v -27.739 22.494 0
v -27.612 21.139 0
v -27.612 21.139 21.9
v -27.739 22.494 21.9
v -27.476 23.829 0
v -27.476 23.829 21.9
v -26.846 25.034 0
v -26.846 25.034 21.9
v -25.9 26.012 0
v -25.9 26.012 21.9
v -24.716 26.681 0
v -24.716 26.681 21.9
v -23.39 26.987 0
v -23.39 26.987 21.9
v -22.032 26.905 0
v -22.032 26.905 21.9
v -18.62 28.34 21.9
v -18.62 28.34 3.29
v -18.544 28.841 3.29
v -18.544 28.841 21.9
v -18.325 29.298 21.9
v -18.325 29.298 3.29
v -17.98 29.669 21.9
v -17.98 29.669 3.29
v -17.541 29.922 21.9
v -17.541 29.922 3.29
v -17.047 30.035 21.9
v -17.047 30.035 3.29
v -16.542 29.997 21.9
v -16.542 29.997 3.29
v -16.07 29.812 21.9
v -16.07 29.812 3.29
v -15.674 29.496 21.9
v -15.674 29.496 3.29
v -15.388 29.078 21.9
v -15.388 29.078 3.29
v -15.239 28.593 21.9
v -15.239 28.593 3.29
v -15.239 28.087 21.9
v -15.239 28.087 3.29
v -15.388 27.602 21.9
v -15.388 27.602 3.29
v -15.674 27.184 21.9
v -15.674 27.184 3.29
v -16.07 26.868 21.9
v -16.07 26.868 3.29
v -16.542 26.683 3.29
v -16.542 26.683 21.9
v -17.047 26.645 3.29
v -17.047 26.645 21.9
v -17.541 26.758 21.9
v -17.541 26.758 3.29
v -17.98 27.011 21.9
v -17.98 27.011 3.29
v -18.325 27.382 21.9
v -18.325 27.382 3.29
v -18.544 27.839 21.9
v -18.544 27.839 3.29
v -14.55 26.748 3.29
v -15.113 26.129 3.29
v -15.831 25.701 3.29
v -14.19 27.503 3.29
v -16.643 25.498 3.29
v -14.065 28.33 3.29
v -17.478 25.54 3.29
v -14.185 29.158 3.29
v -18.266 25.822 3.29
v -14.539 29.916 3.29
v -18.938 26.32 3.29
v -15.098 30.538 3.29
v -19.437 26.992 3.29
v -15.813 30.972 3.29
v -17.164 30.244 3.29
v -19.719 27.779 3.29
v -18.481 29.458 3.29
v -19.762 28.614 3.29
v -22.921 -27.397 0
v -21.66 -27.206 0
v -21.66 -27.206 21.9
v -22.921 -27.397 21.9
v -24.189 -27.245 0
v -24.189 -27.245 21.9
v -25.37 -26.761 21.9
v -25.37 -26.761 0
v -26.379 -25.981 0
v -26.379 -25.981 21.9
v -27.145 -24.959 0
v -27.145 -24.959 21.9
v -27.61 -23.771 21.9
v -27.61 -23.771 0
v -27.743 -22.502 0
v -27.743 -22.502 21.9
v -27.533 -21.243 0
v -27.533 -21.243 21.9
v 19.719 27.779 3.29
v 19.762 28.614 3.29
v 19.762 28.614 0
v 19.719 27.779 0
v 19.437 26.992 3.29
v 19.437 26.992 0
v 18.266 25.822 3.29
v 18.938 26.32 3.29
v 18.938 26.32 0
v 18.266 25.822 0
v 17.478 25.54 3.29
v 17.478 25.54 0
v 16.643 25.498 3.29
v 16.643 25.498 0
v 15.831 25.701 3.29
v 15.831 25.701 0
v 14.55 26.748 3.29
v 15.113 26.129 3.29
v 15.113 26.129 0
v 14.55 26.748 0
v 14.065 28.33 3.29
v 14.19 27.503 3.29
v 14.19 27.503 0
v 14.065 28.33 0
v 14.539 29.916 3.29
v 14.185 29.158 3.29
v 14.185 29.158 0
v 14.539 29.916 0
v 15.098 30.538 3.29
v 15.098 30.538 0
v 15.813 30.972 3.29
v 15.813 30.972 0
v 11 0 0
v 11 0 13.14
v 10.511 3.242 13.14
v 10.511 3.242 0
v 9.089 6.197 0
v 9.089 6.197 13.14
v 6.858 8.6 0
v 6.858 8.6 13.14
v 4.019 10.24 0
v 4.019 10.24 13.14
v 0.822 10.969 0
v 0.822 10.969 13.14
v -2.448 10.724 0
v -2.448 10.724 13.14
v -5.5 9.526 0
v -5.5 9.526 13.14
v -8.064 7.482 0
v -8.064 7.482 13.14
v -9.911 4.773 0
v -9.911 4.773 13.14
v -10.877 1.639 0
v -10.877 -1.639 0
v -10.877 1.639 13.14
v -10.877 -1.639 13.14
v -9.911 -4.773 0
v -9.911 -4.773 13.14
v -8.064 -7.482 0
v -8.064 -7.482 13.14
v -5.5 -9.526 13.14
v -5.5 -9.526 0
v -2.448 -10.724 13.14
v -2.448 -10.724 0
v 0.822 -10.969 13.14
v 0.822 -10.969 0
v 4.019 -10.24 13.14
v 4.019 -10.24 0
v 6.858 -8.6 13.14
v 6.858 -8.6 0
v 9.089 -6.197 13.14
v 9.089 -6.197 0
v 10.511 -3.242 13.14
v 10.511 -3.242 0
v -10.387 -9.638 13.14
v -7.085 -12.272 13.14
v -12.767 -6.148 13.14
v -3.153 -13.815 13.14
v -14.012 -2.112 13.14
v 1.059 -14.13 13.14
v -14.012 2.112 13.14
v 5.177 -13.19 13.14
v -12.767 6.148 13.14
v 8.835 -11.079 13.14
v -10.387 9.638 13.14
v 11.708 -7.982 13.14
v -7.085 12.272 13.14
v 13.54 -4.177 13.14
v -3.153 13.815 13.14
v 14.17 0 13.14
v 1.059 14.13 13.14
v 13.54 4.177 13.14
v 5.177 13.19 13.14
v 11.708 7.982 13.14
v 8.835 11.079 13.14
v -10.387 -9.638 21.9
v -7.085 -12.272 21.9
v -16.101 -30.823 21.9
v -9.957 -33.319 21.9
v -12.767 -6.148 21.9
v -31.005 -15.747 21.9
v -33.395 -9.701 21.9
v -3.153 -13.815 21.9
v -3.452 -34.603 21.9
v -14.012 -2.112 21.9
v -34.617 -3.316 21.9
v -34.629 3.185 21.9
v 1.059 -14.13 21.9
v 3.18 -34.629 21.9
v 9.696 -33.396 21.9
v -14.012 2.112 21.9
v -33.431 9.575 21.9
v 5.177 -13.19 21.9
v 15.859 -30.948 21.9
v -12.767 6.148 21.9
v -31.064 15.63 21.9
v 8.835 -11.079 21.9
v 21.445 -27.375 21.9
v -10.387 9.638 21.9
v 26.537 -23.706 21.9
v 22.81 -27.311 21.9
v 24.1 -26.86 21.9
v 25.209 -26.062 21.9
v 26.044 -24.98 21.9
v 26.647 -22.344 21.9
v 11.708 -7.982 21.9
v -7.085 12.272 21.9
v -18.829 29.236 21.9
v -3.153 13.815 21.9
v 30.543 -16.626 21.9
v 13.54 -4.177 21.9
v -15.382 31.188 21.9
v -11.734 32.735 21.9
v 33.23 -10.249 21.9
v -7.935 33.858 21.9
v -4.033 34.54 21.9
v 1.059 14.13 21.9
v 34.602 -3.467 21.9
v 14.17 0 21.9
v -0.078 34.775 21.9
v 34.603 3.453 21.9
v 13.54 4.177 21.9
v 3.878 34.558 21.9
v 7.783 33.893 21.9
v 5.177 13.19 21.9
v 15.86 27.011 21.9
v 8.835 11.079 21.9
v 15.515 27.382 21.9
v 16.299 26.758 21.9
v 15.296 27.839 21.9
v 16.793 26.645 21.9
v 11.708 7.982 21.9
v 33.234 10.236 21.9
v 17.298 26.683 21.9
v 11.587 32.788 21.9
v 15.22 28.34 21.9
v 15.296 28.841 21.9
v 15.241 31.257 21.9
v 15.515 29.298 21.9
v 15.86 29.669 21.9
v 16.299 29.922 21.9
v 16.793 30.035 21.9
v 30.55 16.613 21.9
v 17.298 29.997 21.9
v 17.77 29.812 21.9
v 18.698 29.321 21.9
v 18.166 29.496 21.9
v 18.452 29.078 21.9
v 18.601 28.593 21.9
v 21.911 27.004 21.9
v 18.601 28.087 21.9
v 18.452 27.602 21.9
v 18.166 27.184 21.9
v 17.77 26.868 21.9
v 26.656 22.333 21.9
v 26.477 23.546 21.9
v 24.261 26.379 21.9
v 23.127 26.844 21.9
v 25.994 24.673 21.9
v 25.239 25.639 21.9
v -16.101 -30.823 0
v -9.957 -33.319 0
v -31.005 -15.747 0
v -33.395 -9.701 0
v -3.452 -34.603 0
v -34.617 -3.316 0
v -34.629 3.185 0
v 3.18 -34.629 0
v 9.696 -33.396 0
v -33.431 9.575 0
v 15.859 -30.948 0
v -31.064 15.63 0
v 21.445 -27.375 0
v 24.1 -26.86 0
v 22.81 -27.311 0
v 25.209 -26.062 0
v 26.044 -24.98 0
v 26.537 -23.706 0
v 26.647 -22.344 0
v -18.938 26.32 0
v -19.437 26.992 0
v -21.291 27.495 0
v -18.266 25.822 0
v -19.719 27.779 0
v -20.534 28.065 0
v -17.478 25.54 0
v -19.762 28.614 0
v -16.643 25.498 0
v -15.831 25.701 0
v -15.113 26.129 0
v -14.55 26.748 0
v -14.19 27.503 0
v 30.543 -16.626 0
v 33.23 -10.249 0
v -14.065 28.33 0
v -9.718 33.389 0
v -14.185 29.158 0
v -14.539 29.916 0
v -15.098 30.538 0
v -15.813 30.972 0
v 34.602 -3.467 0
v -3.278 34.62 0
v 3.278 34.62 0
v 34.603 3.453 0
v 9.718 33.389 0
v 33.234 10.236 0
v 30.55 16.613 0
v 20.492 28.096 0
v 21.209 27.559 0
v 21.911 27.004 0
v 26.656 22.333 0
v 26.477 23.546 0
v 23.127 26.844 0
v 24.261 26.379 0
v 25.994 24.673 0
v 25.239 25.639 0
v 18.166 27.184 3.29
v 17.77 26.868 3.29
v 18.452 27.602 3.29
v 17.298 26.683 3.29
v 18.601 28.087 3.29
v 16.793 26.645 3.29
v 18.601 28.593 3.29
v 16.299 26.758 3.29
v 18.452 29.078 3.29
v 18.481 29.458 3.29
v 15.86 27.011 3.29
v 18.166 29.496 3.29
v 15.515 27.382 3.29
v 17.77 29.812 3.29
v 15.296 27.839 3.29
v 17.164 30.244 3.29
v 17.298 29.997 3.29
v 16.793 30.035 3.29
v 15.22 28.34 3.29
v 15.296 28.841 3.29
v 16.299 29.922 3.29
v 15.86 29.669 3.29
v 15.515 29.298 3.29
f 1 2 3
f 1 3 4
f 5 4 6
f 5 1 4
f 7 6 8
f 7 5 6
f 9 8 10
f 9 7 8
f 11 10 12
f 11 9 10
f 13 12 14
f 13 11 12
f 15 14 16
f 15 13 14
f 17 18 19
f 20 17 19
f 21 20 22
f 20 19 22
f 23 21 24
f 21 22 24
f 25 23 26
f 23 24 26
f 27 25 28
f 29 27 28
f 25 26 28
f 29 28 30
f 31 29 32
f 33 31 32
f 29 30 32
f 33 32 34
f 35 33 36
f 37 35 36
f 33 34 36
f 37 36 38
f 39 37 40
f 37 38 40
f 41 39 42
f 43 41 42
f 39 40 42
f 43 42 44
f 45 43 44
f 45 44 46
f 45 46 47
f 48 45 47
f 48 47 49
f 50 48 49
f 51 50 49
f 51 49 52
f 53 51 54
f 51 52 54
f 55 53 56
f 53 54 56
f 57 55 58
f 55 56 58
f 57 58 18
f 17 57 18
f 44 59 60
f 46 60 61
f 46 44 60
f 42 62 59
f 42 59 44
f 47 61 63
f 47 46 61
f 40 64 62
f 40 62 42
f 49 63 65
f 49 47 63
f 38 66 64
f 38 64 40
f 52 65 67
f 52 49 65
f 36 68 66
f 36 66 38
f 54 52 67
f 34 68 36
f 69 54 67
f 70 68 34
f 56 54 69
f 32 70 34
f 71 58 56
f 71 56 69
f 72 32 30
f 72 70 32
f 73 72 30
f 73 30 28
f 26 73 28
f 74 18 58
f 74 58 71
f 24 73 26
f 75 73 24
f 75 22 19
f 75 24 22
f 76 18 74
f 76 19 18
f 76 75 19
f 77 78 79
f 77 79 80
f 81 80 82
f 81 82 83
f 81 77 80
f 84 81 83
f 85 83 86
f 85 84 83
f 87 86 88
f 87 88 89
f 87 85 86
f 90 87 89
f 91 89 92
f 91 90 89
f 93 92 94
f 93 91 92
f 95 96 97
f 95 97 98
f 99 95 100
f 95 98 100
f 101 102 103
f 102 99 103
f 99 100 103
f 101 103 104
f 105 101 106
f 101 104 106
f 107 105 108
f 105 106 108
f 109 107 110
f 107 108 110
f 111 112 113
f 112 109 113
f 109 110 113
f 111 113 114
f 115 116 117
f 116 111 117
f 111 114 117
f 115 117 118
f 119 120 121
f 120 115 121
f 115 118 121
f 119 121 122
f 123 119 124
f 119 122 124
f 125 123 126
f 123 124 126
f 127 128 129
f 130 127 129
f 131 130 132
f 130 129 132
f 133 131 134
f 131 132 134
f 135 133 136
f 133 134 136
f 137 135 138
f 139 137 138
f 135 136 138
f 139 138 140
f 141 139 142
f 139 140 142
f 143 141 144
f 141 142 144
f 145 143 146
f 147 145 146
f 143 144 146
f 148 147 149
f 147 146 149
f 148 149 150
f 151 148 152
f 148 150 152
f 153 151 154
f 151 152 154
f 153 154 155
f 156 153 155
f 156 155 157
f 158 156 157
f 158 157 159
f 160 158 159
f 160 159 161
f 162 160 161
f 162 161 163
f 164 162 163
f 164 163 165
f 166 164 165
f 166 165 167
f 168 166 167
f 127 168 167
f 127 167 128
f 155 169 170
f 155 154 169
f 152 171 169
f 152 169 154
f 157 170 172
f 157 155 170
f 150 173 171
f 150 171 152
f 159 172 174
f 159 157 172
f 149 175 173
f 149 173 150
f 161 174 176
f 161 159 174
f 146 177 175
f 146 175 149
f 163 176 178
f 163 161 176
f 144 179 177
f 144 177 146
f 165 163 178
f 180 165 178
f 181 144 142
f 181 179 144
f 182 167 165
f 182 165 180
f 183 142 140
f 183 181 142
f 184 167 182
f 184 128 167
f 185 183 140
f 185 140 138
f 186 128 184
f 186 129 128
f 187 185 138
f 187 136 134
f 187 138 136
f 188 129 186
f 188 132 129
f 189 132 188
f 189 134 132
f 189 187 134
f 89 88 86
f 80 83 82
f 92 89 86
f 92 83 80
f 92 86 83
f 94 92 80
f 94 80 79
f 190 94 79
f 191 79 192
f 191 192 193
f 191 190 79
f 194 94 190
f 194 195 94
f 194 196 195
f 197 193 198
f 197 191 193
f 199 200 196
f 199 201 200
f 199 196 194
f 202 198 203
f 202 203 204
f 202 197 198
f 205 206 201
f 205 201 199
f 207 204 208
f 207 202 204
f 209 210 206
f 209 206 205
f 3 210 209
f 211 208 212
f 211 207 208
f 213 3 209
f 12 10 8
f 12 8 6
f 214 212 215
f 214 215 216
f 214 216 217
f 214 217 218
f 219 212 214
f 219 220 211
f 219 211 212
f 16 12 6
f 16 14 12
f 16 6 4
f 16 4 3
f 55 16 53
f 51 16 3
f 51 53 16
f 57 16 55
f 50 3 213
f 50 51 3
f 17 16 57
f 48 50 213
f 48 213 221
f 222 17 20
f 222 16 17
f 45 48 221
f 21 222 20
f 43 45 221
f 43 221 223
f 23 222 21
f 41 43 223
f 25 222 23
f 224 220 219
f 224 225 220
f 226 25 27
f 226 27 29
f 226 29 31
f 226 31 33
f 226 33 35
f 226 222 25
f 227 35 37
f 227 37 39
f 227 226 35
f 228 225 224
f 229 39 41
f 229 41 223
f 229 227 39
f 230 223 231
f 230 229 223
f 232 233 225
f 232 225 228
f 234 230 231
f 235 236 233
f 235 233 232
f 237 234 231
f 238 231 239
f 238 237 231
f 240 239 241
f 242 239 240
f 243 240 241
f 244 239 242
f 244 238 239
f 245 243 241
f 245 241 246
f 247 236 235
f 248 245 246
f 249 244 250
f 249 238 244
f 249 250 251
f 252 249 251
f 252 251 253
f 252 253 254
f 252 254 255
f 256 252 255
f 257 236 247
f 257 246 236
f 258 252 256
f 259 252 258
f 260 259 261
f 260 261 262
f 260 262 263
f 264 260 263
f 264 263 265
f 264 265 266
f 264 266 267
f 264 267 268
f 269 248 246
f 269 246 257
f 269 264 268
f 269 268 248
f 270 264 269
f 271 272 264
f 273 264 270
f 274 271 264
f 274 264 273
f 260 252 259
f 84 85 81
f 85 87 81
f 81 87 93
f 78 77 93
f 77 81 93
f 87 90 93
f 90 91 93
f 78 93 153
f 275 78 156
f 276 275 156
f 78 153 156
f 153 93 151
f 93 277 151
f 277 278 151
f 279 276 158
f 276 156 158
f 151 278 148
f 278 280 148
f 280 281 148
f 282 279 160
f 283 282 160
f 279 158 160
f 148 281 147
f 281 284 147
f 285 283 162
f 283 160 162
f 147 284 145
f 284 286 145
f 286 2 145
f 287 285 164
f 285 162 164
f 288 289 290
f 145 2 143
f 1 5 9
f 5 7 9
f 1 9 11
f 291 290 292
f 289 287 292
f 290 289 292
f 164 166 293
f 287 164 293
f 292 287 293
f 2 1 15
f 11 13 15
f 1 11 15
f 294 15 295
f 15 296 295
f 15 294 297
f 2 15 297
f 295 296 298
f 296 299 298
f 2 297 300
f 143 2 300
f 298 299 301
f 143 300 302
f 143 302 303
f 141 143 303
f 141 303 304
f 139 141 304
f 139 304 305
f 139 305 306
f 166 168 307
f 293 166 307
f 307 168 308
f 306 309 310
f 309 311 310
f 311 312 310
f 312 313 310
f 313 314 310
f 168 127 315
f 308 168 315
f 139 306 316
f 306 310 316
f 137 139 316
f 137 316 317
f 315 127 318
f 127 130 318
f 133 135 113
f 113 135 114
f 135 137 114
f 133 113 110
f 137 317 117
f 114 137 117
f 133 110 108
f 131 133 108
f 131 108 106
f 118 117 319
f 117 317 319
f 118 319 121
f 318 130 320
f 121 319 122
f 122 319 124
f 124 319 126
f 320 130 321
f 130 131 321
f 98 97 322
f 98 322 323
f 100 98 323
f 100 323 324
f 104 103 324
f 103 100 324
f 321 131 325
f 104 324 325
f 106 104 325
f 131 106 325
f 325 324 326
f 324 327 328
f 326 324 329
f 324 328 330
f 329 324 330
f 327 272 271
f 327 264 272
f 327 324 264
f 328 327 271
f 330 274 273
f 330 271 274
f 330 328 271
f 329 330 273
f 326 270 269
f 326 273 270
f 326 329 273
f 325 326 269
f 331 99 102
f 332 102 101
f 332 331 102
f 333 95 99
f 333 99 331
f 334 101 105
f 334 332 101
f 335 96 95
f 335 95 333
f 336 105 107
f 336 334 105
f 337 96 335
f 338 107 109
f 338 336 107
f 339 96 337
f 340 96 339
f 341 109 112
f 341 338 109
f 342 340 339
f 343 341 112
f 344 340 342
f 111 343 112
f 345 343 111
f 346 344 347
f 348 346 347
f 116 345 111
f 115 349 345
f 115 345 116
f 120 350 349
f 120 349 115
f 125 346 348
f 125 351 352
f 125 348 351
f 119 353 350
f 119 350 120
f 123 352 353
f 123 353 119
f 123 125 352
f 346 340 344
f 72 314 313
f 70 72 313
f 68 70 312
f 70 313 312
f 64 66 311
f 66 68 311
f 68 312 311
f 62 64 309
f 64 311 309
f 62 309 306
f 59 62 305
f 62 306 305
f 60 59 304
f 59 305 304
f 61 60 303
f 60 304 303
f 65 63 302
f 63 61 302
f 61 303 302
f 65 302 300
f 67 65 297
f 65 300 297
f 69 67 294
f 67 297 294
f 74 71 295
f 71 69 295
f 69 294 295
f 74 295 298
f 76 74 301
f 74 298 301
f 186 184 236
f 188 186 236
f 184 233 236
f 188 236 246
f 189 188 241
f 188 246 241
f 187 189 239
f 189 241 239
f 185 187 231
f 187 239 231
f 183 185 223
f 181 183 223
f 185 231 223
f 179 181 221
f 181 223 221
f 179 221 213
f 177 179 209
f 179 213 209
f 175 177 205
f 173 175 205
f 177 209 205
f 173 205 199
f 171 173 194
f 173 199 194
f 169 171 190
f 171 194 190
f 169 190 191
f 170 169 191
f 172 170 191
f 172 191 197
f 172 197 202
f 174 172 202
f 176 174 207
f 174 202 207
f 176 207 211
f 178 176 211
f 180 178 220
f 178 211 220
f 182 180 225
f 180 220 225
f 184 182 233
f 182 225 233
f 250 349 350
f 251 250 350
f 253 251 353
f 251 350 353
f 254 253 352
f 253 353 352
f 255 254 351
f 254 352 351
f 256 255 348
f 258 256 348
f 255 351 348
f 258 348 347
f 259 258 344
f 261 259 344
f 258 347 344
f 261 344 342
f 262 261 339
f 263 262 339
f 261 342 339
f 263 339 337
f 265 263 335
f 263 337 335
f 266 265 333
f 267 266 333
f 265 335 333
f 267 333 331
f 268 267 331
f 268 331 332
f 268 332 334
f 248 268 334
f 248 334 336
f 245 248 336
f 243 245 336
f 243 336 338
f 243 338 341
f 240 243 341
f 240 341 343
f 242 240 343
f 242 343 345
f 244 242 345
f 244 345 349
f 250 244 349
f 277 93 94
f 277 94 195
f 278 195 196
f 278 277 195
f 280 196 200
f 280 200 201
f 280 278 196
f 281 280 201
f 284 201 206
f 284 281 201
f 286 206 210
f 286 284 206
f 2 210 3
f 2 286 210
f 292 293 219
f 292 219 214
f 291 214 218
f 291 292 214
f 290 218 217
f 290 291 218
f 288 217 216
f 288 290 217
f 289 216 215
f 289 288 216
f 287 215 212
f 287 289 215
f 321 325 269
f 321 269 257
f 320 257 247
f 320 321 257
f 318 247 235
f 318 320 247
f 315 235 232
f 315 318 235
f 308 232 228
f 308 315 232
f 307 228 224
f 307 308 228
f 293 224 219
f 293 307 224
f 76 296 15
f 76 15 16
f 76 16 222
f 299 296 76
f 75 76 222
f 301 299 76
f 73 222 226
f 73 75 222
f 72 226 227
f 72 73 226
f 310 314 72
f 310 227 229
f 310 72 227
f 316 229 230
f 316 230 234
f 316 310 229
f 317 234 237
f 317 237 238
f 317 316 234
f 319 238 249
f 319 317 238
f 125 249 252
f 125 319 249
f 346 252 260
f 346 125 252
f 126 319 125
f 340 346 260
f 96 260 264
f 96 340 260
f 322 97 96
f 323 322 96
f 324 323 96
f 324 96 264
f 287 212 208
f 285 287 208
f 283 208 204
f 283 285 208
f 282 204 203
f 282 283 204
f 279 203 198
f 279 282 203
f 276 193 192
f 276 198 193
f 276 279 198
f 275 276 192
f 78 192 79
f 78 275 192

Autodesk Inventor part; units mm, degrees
ref_plane "YZ Plane" through (0, 0, 0) normal (1, 0, 0) x (0, 1, 0)
ref_plane "XZ Plane" through (0, 0, 0) normal (0, 1, 0) x (-1, 0, 0)
ref_plane "XY Plane" through (0, 0, 0) normal (0, 0, 1) x (1, 0, 0)
sketch "Sketch1" plane through (0, 0, 0) normal (0, 0, 1) x (1, 0, 0)
  circle A0 centre (0, 0) radius 11.25
  arc A1 (-32.7929, -17.201) -> (-31.2929, -19.799) centre (0, 0) ccw
  line L0 (-32.7929, -17.201) -> (-31.0547, -16.1974)
  line L1 (-32.7929, -17.201) -> (-31.0547, -16.1974)
  line L2 (-29.5547, -18.7955) -> (-31.2929, -19.799)
  line L3 (-31.2929, -19.799) -> (-29.5547, -18.7955)
  line L4 (-16.1974, -31.0547) -> (-17.201, -32.7929)
  line L5 (-17.201, -32.7929) -> (-16.1974, -31.0547)
  arc A2 (-19.799, -31.2929) -> (-17.201, -32.7929) centre (0, 0) ccw
  line L6 (-19.799, -31.2929) -> (-18.7955, -29.5547)
  line L7 (-19.799, -31.2929) -> (-18.7955, -29.5547)
  arc A3 (17.201, -32.7929) -> (19.799, -31.2929) centre (0, 0) ccw
  line L8 (17.201, -32.7929) -> (16.1974, -31.0547)
  line L9 (17.201, -32.7929) -> (16.1974, -31.0547)
  line L10 (18.7955, -29.5547) -> (19.799, -31.2929)
  line L11 (19.799, -31.2929) -> (18.7955, -29.5547)
  arc A4 (31.2929, -19.799) -> (32.7929, -17.201) centre (0, 0) ccw
  line L12 (31.2929, -19.799) -> (29.5547, -18.7955)
  line L13 (31.0547, -16.1974) -> (32.7929, -17.201)
  line L14 (32.7929, -17.201) -> (31.0547, -16.1974)
  line L15 (32.7929, 17.201) -> (31.0547, 16.1974)
  line L16 (32.7929, 17.201) -> (31.0547, 16.1974)
  arc A5 (32.7929, 17.201) -> (31.2929, 19.799) centre (0, 0) ccw
  line L17 (29.5547, 18.7955) -> (31.2929, 19.799)
  line L18 (31.2929, 19.799) -> (29.5547, 18.7955)
  line L19 (16.1974, 31.0547) -> (17.201, 32.7929)
  line L20 (17.201, 32.7929) -> (16.1974, 31.0547)
  line L21 (19.799, 31.2929) -> (18.7955, 29.5547)
  line L22 (19.799, 31.2929) -> (18.7955, 29.5547)
  line L23 (-17.201, 32.7929) -> (-16.1974, 31.0547)
  line L24 (-17.201, 32.7929) -> (-16.1974, 31.0547)
  line L25 (-18.7955, 29.5547) -> (-19.799, 31.2929)
  line L26 (-19.799, 31.2929) -> (-18.7955, 29.5547)
  arc A6 (-31.2615, 19.7809) -> (-32.7929, 17.201) centre (-0.5443, -0.1969) ccw
  line L27 (-31.2615, 19.7809) -> (-29.5547, 18.7955)
  line L28 (-31.2615, 19.7809) -> (-29.5547, 18.7955)
  line L29 (-31.0547, 16.1974) -> (-32.7929, 17.201)
  line L30 (-32.7929, 17.201) -> (-31.0547, 16.1974)
  arc A7 (-27.9532, 21.6091) -> (-22.3503, 27.212) centre (-22.995, 22.2538) ccw
  circle A8 centre (-22.995, 22.2538) radius 5
  circle A9 centre (21.9063, 22.2538) radius 5
  circle A10 centre (21.9063, 22.2538) radius 5
  circle A11 centre (-22.995, 22.2538) radius 4.75
  circle A12 centre (-22.995, -22.6475) radius 4.75
  circle A13 centre (21.9063, -22.6475) radius 4.75
  circle A14 centre (21.9063, 22.2538) radius 4.75
  circle A15 centre (0, 0) radius 34.775
  circle A16 centre (0, 0) radius 36.75
  point P0 (0, 0)
  point P1 (0, 49.75)
  point P2 (26.6556, 22.3333)
  point P3 (21.9111, 27.0038)
  point P4 (-22.0321, 26.9051)
  point P5 (-27.6123, 21.1391)
  point P6 (-27.5325, -21.2429)
  point P7 (-21.6596, -27.2059)
  point P8 (21.4454, -27.3751)
  point P9 (26.6466, -22.3441)
  dimension "d6" = 70.05
  dimension "d8" = 74.0608
  dimension "d0" = 10
  dimension "d1" = 0.25
  dimension "d4" = 360
  dimension "d7" = 0.25
  dimension "d9" = 73.5
extrude "Extrusion1" add sketch "Sketch1" along normal blind 21.9 contours A0 | A16 A12 | A12 A15 A16 | A15 A7 A9 A13 A12 | A12 A15 | A15 A11 A7 | A11 A15 | A15 A11 | A15 A13 | A13 A15 | A15 A14 A9 | A15 A14 | A14 A15 picked at (20.2713, 26.7736)
sketch "Skizze4" plane through (0, 0, 21.9) normal (0, 0, 1) x (1, 0, 0)
  circle A0 centre (0, 0) radius 11
  dimension "d24" = 22
extrude "Extrusion4" cut sketch "Skizze4" against normal up to surface (21.9 mm away) from surface at 0
sketch "Skizze5" plane through (0, 0, 21.9) normal (0, 0, 1) x (1, 0, 0)
  circle A0 centre (0, 0) radius 11 projected
  circle A1 centre (0, 0) radius 14.17
  dimension "d27" = 28.34
extrude "Extrusion5" cut sketch "Skizze5" against normal blind 8.76 contours A0 | A1
sketch "Skizze6" plane through (0, 0, 0) normal (0, 0, -1) x (-1, 0, 0)
  line L0 (0, 0) -> (-16.92, 0)
  line L1 (-16.92, 0) -> (-16.92, 28.34)
  line L2 (-16.92, 28.34) -> (0, 28.34)
  line L3 (0, 28.34) -> (0, 0)
  circle A0 centre (-16.92, 28.34) radius 1.7
  circle A1 centre (16.92, 28.34) radius 1.7
  dimension "d30" = 16.92
  dimension "d31" = 28.34
  dimension "d32" = 3.4
extrude "Extrusion6" cut sketch "Skizze6" against normal through all contours A0 L2 L1 | L1 L2 A0 | A1
sketch "Skizze8" plane through (0, 0, 0) normal (0, 0, -1) x (-1, 0, 0)
  circle A0 centre (-16.92, 28.34) radius 1.7 projected
  circle A1 centre (-16.92, 28.34) radius 2.855
  circle A2 centre (16.92, 28.34) radius 1.7 projected
  circle A3 centre (16.92, 28.34) radius 2.855
  point P0 (0, 0)
  dimension "d39" = 5.71
  dimension "d40" = 5.71
extrude "Extrusion8" cut sketch "Skizze8" against normal blind 3.29 contours A1 | A2 | A3
properties part number "2024_08_22_LED_blende"
